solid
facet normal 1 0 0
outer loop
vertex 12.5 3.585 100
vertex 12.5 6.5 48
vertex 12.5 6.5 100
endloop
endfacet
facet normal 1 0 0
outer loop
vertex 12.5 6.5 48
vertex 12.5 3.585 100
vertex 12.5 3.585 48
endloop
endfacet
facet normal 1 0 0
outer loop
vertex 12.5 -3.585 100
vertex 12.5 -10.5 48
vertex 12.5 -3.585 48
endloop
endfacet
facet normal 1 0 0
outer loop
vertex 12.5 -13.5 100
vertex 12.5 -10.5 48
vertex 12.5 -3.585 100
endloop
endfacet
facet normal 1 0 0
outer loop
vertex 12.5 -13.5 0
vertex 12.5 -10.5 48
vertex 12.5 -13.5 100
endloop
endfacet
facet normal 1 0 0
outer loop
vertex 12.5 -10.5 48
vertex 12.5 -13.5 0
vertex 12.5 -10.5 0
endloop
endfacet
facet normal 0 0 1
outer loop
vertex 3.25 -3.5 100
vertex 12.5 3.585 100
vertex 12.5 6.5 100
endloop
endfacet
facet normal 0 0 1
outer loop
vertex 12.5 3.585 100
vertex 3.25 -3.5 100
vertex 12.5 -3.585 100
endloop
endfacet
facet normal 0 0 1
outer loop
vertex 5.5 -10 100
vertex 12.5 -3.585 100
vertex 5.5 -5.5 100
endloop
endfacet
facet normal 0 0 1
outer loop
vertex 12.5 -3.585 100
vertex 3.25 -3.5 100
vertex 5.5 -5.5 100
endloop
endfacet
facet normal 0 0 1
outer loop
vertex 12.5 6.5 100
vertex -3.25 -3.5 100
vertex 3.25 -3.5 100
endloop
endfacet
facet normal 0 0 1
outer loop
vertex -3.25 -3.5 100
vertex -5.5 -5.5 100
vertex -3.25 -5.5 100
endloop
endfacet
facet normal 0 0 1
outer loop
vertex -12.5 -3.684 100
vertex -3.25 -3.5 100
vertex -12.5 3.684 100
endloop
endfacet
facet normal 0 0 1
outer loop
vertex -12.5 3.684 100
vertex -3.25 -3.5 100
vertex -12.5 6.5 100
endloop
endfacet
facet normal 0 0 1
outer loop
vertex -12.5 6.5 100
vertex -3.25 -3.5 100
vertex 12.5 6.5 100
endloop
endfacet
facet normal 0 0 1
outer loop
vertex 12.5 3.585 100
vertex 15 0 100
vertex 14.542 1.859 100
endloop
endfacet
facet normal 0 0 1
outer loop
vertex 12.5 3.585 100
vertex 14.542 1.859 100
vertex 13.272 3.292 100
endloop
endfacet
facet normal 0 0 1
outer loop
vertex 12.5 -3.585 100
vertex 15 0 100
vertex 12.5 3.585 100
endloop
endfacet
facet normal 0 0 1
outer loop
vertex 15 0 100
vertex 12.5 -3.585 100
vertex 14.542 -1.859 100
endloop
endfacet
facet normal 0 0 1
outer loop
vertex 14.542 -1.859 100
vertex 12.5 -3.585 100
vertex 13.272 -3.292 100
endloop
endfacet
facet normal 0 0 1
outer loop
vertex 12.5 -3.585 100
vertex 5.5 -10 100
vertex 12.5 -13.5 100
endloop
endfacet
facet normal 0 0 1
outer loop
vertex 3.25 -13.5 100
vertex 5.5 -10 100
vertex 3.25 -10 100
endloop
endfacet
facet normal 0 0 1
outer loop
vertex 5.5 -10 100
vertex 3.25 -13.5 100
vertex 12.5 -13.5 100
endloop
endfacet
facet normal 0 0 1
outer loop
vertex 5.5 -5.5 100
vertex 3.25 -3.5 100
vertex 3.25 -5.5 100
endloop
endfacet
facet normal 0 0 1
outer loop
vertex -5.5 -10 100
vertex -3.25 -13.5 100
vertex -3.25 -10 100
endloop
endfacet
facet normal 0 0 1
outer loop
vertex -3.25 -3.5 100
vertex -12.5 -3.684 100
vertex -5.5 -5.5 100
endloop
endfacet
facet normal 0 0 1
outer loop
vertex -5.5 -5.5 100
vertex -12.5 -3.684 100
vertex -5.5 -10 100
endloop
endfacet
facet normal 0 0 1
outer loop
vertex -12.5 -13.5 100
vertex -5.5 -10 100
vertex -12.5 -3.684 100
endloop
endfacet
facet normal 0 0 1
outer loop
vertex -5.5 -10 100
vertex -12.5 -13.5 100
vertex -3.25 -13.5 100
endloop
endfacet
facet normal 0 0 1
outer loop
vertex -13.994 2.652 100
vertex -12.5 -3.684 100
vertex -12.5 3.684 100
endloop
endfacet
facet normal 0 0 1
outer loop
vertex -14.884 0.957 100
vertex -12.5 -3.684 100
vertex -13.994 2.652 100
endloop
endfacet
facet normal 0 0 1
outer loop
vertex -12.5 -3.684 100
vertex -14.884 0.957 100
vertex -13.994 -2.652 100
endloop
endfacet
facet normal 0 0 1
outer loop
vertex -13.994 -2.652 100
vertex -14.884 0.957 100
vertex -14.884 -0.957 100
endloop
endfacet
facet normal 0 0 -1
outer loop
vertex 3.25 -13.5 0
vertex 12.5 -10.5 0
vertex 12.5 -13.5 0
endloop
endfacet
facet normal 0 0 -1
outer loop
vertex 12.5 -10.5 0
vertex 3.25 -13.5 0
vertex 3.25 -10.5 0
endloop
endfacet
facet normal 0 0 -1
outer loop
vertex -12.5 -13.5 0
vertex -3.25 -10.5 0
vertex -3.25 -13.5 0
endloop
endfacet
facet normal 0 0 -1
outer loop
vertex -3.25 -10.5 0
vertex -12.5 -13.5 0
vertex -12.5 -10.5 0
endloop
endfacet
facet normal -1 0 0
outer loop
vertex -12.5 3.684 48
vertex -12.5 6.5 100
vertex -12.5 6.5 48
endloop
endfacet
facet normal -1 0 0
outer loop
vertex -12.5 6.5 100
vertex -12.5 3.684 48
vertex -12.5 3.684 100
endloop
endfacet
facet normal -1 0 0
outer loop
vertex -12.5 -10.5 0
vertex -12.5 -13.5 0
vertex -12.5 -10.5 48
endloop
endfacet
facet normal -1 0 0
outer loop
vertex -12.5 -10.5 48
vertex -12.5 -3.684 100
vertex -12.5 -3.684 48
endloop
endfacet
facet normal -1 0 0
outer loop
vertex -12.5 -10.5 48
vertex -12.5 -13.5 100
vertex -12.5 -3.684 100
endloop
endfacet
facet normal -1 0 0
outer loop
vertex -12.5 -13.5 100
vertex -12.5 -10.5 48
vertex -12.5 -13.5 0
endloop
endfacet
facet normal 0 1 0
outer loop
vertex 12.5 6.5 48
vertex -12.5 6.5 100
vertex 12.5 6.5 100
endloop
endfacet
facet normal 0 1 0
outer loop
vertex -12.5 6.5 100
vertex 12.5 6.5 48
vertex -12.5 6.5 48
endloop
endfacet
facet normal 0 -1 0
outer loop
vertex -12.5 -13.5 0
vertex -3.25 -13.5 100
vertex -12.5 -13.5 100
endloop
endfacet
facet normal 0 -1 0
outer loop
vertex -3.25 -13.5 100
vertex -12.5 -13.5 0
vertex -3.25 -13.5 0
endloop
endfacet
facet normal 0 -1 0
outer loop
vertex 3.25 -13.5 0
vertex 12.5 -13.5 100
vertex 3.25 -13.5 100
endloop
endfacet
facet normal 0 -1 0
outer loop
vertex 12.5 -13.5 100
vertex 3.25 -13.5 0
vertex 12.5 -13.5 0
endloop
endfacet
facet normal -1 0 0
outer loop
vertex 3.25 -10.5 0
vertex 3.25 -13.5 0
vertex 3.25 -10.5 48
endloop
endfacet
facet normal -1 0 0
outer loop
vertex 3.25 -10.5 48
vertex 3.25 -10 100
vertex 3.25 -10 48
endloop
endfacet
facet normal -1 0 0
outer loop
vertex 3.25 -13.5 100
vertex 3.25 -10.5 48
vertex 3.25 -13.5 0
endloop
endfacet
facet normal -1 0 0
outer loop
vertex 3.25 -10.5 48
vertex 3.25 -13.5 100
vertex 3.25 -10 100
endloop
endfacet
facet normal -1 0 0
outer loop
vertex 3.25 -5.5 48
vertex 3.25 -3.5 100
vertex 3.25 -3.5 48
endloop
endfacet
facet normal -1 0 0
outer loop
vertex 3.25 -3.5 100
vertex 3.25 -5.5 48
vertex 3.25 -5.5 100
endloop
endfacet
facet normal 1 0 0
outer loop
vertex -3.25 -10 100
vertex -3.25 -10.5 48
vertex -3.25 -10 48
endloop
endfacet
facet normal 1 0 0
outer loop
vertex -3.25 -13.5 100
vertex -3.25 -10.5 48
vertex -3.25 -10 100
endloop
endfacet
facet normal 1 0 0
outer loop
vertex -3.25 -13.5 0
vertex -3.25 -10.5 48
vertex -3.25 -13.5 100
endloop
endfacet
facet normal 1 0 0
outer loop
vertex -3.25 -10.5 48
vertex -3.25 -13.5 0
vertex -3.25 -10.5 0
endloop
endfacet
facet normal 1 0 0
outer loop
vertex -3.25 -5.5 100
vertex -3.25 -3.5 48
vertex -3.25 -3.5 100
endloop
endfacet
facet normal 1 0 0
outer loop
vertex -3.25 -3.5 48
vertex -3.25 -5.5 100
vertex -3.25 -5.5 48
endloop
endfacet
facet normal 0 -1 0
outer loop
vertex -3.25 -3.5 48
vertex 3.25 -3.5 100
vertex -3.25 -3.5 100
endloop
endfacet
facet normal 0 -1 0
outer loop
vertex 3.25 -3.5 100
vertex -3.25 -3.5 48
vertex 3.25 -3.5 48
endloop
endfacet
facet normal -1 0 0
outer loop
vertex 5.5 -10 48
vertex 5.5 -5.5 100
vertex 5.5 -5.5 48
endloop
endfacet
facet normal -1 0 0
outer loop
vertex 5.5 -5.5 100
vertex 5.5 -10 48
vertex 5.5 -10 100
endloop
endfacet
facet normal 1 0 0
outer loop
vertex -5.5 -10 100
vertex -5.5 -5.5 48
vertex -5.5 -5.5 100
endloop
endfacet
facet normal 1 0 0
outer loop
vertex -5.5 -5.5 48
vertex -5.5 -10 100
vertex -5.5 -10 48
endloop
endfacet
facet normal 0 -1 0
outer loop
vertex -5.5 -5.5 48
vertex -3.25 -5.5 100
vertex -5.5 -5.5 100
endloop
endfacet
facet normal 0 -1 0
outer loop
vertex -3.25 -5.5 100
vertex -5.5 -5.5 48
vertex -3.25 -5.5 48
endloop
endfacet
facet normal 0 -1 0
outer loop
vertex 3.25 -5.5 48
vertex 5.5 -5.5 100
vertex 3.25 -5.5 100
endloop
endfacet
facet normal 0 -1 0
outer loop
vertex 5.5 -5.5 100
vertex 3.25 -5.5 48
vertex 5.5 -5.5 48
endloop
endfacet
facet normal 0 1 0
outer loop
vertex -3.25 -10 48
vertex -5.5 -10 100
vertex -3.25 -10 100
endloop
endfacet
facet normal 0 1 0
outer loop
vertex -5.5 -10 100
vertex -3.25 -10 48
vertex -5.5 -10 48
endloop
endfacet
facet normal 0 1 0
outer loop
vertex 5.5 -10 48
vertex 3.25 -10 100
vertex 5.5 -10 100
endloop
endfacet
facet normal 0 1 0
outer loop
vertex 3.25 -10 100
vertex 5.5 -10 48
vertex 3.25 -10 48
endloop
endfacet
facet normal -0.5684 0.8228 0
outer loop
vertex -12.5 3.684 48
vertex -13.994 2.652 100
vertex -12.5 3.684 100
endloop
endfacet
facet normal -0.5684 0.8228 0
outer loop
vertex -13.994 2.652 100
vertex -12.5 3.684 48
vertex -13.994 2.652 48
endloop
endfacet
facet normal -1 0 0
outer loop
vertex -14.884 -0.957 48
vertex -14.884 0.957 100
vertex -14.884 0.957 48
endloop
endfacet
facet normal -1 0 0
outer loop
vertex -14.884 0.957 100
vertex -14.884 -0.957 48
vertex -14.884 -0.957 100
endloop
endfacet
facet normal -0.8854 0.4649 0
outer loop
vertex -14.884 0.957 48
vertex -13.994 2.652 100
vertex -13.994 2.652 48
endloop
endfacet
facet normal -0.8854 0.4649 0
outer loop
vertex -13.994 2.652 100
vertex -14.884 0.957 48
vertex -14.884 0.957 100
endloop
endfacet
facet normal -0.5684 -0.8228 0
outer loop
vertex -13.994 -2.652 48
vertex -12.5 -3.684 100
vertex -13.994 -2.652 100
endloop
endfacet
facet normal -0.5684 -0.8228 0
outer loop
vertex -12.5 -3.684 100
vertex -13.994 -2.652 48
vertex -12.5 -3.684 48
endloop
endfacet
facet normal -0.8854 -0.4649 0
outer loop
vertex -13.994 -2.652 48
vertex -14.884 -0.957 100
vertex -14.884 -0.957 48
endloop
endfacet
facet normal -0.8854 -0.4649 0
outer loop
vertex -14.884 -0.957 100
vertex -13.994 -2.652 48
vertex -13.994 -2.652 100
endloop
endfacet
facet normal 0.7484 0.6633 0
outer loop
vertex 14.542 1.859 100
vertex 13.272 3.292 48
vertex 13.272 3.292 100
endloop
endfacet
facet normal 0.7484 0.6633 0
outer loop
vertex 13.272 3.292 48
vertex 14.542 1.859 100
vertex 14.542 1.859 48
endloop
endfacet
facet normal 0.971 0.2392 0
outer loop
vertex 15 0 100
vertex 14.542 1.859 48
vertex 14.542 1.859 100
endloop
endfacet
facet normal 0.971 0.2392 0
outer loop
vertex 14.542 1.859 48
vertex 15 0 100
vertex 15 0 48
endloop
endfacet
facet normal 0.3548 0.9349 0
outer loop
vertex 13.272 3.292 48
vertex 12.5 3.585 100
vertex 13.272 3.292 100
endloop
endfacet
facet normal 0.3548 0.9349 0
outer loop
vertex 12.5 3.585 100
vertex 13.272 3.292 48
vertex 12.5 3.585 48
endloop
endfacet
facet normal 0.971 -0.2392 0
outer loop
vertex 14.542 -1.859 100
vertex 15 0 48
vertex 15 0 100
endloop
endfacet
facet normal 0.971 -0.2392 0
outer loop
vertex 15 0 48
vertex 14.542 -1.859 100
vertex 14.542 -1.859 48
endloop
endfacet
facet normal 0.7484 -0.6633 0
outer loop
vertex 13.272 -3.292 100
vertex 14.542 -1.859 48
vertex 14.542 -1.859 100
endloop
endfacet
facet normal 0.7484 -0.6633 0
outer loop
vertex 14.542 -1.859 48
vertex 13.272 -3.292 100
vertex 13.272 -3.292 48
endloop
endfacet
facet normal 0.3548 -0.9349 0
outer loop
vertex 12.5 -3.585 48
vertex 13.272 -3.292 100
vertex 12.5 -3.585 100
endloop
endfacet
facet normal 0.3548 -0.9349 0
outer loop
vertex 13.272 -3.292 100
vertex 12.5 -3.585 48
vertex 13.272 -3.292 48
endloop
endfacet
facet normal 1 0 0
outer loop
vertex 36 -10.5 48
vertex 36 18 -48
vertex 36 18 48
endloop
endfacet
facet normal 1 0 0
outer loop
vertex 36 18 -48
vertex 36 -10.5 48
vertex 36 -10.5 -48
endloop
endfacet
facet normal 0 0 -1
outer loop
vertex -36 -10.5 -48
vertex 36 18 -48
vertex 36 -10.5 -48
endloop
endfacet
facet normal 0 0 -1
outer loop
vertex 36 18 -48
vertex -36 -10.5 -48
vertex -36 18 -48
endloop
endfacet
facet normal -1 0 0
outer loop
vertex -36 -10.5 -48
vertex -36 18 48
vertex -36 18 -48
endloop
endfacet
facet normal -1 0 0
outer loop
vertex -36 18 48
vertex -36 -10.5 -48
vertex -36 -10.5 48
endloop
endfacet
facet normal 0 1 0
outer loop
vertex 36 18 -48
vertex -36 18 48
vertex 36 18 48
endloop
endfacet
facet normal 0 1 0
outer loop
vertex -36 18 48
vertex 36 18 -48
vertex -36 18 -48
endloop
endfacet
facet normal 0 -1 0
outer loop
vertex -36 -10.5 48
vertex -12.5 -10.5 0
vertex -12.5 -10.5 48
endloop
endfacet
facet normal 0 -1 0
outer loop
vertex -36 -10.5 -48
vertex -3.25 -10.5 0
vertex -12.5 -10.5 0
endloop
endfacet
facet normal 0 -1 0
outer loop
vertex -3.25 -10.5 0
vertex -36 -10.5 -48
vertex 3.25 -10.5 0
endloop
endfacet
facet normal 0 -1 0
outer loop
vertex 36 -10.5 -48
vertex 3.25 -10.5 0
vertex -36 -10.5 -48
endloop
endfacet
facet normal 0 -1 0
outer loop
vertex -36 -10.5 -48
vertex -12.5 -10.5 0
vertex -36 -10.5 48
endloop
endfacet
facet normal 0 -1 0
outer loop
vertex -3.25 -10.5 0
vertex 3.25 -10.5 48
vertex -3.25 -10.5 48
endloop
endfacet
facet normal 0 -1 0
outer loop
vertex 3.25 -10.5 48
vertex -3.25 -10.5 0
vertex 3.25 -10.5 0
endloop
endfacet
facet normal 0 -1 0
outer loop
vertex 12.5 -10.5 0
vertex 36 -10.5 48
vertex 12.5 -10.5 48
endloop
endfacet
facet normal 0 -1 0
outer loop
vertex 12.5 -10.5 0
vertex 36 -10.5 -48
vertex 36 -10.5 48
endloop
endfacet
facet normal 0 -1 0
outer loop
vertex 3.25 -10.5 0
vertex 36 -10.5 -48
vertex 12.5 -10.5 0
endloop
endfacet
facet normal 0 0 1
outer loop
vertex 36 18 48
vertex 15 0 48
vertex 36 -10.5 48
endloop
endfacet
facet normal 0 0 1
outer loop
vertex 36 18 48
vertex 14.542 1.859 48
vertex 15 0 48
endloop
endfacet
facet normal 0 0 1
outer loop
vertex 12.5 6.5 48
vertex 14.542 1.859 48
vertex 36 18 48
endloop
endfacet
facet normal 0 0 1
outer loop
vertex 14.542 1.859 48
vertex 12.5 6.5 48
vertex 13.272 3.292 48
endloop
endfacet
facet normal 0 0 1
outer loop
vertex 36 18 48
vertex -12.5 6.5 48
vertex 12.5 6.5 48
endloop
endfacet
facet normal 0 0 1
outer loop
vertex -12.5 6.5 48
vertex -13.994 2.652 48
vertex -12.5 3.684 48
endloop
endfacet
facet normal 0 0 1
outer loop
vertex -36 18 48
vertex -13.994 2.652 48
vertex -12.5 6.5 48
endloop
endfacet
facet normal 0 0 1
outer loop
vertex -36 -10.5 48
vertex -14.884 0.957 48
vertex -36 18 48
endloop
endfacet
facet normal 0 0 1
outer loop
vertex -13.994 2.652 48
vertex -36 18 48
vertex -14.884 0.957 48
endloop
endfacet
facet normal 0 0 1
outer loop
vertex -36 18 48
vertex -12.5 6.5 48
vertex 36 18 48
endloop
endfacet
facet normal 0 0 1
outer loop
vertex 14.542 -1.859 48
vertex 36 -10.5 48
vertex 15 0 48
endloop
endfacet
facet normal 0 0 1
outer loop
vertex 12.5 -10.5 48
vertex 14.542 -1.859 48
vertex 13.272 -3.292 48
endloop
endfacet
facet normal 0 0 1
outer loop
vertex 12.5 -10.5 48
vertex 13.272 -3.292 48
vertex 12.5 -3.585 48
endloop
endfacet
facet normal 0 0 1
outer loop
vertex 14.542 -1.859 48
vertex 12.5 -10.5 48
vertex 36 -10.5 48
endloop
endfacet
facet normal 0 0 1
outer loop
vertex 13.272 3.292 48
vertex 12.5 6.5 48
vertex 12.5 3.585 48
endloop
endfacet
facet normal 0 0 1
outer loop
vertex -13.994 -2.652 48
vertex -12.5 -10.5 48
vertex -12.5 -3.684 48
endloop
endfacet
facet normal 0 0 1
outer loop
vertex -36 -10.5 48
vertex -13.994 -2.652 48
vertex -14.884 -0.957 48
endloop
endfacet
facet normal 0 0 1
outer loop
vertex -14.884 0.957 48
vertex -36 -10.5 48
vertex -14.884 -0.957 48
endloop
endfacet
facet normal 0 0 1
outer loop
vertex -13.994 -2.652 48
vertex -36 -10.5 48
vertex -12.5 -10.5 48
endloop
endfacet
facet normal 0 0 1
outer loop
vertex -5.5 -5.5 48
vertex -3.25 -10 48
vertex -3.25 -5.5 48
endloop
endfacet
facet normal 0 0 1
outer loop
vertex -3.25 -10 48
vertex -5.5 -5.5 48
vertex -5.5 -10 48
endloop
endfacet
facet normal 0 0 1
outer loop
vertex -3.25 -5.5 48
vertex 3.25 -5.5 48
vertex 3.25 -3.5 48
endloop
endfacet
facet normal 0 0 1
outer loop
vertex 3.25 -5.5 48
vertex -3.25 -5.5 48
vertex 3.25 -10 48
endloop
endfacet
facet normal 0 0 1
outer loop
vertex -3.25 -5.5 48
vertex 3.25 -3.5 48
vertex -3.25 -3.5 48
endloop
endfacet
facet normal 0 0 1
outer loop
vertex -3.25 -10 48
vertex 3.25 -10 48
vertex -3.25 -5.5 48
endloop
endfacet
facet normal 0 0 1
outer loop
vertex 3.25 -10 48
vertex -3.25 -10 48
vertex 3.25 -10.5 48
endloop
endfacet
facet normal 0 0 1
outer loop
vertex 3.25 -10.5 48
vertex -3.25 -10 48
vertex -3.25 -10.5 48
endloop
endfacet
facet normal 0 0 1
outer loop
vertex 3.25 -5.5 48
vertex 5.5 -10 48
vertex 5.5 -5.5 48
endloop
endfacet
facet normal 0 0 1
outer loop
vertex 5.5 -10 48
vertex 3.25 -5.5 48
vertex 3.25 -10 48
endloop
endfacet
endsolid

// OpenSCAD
// file: ../machine.scad
/*
 * Helpers for machinging; i.e. kerf alowances
 *
 * Copyright 2013 <b@Zi.iS>
 * License CC BY 3.0
 */

ZCUT = 0;
XOFF = 0;
YOFF = 0;

module drawing() {
	//create blueprint
	if(preview==0) {
		projection(cut=true) translate([
			XOFF,
			YOFF,
			ZCUT
		]) {
            if($children) children([0:$children-1]);
		}
	} else {
        if($children) children([0:$children-1]);
	}
}

module kerf_cube(
	size
) {
	translate([
		kerf/2*(1-preview),
		kerf/2*(1-preview),
		0
	]) {
		cube([
			size[0] - kerf*(1-preview),
			size[1] - kerf*(1-preview),
			size[2]
		]);
	}
}

module kerf_cylinder(
	r,
	h
) {
	cylinder(
		r = r - kerf/2*(1-preview),
		h = h
	);
}

module part(
	id,
	name
) {
	if(PART<1 || PART==id || id<0) {
		if(id>=0) echo(str("PART", id, ":", name));
        if($children) children([0:$children-1]);
	}	
}
// file: ../easing.scad
/*
 * Make allowances to ensure good fit.
 *
 * Copyright 2013 <b@Zi.iS>
 * License CC BY 3.0
 */

function ease(value) = min(value*1.1, value + .2);
// file: ../epslion.scad
/*
 * Slightly offset previews to overcome rounding issues
 *
 * Copyright 2013 <b@Zi.iS>
 * License CC BY 3.0
 */

include <config.scad>;

module e(
	shift = -.1,
	size = 1.1
) {
	if(preview == 1) {
		translate([
			0,
			0,
			shift
		]) {
			scale([
				1,
				1,
				size
			]) {
                if($children) children([0:$children-1]);
			}
		}
	} else {
        if($children) children([0:$children-1]);
	}
}

function space(pitch, i) = -pitch/2 + pitch*i;
// file: ../config.scad
/*
 * Default settings
 *
 * Copyright 2013 <b@Zi.iS>
 * License CC BY 3.0
 */

preview = 1;
$fa = 6;
$fs = 2 - 1.5*(1-preview);
kerf = .3;
PART = 0; //all

// preview colors
color_steel = [.8, .8, .8];
color_wood = [.3, .3, 0];
color_print = [0, .8, 0];
color_plastic = [.7, 1, .7];
color_brass = [181/255, 166/255, 66/255];
color_acrylic = [.9,.9,.9,.5];
// file: ../main.scad
/*
 * A library to make SCAD easier.
 *
 * Copyright 2013 <b@Zi.iS>
 * License CC BY 3.0
 */

include <config.scad>;
use <epslion.scad>;
use <easing.scad>;
include <machine.scad>;
// main file
include <../main.scad>;

lfs81();
lfs81_bearing();

module lfs81(h=100, id) {
	part(id, str(h, "mm of LFS-8-1")) {
		color([.7,.7,.7])
			difference() {
				translate([-25/2, -13.5, 0])
					cube([25, 20, h]);
				translate([-6.5/2, -14, -.1])
					cube([6.5, 10.5, h+.2]);
				translate([-11/2, -10, -.1])
					cube([11, 4.5, h+.2]);
			}
		for(x=[-11,11])
			translate([x, 0, 0])
				color([.8,.8,.8])
					cylinder(d=8, h=h);
	}
}

module lfs81_bearing(id) {
	part(id, "LFS-8-1 bearing") {
		translate([-72/2,-10.5,-48]) color([.0,.0,.0]) cube([72, 28.5, 13]);
		translate([-72/2,-10.5,-35]) color([.7,.7,.7]) cube([72, 28.5, 70]);
		translate([-72/2,-10.5,35]) color([.0,.0,.0]) cube([72, 28.5, 13]);
	}
}
